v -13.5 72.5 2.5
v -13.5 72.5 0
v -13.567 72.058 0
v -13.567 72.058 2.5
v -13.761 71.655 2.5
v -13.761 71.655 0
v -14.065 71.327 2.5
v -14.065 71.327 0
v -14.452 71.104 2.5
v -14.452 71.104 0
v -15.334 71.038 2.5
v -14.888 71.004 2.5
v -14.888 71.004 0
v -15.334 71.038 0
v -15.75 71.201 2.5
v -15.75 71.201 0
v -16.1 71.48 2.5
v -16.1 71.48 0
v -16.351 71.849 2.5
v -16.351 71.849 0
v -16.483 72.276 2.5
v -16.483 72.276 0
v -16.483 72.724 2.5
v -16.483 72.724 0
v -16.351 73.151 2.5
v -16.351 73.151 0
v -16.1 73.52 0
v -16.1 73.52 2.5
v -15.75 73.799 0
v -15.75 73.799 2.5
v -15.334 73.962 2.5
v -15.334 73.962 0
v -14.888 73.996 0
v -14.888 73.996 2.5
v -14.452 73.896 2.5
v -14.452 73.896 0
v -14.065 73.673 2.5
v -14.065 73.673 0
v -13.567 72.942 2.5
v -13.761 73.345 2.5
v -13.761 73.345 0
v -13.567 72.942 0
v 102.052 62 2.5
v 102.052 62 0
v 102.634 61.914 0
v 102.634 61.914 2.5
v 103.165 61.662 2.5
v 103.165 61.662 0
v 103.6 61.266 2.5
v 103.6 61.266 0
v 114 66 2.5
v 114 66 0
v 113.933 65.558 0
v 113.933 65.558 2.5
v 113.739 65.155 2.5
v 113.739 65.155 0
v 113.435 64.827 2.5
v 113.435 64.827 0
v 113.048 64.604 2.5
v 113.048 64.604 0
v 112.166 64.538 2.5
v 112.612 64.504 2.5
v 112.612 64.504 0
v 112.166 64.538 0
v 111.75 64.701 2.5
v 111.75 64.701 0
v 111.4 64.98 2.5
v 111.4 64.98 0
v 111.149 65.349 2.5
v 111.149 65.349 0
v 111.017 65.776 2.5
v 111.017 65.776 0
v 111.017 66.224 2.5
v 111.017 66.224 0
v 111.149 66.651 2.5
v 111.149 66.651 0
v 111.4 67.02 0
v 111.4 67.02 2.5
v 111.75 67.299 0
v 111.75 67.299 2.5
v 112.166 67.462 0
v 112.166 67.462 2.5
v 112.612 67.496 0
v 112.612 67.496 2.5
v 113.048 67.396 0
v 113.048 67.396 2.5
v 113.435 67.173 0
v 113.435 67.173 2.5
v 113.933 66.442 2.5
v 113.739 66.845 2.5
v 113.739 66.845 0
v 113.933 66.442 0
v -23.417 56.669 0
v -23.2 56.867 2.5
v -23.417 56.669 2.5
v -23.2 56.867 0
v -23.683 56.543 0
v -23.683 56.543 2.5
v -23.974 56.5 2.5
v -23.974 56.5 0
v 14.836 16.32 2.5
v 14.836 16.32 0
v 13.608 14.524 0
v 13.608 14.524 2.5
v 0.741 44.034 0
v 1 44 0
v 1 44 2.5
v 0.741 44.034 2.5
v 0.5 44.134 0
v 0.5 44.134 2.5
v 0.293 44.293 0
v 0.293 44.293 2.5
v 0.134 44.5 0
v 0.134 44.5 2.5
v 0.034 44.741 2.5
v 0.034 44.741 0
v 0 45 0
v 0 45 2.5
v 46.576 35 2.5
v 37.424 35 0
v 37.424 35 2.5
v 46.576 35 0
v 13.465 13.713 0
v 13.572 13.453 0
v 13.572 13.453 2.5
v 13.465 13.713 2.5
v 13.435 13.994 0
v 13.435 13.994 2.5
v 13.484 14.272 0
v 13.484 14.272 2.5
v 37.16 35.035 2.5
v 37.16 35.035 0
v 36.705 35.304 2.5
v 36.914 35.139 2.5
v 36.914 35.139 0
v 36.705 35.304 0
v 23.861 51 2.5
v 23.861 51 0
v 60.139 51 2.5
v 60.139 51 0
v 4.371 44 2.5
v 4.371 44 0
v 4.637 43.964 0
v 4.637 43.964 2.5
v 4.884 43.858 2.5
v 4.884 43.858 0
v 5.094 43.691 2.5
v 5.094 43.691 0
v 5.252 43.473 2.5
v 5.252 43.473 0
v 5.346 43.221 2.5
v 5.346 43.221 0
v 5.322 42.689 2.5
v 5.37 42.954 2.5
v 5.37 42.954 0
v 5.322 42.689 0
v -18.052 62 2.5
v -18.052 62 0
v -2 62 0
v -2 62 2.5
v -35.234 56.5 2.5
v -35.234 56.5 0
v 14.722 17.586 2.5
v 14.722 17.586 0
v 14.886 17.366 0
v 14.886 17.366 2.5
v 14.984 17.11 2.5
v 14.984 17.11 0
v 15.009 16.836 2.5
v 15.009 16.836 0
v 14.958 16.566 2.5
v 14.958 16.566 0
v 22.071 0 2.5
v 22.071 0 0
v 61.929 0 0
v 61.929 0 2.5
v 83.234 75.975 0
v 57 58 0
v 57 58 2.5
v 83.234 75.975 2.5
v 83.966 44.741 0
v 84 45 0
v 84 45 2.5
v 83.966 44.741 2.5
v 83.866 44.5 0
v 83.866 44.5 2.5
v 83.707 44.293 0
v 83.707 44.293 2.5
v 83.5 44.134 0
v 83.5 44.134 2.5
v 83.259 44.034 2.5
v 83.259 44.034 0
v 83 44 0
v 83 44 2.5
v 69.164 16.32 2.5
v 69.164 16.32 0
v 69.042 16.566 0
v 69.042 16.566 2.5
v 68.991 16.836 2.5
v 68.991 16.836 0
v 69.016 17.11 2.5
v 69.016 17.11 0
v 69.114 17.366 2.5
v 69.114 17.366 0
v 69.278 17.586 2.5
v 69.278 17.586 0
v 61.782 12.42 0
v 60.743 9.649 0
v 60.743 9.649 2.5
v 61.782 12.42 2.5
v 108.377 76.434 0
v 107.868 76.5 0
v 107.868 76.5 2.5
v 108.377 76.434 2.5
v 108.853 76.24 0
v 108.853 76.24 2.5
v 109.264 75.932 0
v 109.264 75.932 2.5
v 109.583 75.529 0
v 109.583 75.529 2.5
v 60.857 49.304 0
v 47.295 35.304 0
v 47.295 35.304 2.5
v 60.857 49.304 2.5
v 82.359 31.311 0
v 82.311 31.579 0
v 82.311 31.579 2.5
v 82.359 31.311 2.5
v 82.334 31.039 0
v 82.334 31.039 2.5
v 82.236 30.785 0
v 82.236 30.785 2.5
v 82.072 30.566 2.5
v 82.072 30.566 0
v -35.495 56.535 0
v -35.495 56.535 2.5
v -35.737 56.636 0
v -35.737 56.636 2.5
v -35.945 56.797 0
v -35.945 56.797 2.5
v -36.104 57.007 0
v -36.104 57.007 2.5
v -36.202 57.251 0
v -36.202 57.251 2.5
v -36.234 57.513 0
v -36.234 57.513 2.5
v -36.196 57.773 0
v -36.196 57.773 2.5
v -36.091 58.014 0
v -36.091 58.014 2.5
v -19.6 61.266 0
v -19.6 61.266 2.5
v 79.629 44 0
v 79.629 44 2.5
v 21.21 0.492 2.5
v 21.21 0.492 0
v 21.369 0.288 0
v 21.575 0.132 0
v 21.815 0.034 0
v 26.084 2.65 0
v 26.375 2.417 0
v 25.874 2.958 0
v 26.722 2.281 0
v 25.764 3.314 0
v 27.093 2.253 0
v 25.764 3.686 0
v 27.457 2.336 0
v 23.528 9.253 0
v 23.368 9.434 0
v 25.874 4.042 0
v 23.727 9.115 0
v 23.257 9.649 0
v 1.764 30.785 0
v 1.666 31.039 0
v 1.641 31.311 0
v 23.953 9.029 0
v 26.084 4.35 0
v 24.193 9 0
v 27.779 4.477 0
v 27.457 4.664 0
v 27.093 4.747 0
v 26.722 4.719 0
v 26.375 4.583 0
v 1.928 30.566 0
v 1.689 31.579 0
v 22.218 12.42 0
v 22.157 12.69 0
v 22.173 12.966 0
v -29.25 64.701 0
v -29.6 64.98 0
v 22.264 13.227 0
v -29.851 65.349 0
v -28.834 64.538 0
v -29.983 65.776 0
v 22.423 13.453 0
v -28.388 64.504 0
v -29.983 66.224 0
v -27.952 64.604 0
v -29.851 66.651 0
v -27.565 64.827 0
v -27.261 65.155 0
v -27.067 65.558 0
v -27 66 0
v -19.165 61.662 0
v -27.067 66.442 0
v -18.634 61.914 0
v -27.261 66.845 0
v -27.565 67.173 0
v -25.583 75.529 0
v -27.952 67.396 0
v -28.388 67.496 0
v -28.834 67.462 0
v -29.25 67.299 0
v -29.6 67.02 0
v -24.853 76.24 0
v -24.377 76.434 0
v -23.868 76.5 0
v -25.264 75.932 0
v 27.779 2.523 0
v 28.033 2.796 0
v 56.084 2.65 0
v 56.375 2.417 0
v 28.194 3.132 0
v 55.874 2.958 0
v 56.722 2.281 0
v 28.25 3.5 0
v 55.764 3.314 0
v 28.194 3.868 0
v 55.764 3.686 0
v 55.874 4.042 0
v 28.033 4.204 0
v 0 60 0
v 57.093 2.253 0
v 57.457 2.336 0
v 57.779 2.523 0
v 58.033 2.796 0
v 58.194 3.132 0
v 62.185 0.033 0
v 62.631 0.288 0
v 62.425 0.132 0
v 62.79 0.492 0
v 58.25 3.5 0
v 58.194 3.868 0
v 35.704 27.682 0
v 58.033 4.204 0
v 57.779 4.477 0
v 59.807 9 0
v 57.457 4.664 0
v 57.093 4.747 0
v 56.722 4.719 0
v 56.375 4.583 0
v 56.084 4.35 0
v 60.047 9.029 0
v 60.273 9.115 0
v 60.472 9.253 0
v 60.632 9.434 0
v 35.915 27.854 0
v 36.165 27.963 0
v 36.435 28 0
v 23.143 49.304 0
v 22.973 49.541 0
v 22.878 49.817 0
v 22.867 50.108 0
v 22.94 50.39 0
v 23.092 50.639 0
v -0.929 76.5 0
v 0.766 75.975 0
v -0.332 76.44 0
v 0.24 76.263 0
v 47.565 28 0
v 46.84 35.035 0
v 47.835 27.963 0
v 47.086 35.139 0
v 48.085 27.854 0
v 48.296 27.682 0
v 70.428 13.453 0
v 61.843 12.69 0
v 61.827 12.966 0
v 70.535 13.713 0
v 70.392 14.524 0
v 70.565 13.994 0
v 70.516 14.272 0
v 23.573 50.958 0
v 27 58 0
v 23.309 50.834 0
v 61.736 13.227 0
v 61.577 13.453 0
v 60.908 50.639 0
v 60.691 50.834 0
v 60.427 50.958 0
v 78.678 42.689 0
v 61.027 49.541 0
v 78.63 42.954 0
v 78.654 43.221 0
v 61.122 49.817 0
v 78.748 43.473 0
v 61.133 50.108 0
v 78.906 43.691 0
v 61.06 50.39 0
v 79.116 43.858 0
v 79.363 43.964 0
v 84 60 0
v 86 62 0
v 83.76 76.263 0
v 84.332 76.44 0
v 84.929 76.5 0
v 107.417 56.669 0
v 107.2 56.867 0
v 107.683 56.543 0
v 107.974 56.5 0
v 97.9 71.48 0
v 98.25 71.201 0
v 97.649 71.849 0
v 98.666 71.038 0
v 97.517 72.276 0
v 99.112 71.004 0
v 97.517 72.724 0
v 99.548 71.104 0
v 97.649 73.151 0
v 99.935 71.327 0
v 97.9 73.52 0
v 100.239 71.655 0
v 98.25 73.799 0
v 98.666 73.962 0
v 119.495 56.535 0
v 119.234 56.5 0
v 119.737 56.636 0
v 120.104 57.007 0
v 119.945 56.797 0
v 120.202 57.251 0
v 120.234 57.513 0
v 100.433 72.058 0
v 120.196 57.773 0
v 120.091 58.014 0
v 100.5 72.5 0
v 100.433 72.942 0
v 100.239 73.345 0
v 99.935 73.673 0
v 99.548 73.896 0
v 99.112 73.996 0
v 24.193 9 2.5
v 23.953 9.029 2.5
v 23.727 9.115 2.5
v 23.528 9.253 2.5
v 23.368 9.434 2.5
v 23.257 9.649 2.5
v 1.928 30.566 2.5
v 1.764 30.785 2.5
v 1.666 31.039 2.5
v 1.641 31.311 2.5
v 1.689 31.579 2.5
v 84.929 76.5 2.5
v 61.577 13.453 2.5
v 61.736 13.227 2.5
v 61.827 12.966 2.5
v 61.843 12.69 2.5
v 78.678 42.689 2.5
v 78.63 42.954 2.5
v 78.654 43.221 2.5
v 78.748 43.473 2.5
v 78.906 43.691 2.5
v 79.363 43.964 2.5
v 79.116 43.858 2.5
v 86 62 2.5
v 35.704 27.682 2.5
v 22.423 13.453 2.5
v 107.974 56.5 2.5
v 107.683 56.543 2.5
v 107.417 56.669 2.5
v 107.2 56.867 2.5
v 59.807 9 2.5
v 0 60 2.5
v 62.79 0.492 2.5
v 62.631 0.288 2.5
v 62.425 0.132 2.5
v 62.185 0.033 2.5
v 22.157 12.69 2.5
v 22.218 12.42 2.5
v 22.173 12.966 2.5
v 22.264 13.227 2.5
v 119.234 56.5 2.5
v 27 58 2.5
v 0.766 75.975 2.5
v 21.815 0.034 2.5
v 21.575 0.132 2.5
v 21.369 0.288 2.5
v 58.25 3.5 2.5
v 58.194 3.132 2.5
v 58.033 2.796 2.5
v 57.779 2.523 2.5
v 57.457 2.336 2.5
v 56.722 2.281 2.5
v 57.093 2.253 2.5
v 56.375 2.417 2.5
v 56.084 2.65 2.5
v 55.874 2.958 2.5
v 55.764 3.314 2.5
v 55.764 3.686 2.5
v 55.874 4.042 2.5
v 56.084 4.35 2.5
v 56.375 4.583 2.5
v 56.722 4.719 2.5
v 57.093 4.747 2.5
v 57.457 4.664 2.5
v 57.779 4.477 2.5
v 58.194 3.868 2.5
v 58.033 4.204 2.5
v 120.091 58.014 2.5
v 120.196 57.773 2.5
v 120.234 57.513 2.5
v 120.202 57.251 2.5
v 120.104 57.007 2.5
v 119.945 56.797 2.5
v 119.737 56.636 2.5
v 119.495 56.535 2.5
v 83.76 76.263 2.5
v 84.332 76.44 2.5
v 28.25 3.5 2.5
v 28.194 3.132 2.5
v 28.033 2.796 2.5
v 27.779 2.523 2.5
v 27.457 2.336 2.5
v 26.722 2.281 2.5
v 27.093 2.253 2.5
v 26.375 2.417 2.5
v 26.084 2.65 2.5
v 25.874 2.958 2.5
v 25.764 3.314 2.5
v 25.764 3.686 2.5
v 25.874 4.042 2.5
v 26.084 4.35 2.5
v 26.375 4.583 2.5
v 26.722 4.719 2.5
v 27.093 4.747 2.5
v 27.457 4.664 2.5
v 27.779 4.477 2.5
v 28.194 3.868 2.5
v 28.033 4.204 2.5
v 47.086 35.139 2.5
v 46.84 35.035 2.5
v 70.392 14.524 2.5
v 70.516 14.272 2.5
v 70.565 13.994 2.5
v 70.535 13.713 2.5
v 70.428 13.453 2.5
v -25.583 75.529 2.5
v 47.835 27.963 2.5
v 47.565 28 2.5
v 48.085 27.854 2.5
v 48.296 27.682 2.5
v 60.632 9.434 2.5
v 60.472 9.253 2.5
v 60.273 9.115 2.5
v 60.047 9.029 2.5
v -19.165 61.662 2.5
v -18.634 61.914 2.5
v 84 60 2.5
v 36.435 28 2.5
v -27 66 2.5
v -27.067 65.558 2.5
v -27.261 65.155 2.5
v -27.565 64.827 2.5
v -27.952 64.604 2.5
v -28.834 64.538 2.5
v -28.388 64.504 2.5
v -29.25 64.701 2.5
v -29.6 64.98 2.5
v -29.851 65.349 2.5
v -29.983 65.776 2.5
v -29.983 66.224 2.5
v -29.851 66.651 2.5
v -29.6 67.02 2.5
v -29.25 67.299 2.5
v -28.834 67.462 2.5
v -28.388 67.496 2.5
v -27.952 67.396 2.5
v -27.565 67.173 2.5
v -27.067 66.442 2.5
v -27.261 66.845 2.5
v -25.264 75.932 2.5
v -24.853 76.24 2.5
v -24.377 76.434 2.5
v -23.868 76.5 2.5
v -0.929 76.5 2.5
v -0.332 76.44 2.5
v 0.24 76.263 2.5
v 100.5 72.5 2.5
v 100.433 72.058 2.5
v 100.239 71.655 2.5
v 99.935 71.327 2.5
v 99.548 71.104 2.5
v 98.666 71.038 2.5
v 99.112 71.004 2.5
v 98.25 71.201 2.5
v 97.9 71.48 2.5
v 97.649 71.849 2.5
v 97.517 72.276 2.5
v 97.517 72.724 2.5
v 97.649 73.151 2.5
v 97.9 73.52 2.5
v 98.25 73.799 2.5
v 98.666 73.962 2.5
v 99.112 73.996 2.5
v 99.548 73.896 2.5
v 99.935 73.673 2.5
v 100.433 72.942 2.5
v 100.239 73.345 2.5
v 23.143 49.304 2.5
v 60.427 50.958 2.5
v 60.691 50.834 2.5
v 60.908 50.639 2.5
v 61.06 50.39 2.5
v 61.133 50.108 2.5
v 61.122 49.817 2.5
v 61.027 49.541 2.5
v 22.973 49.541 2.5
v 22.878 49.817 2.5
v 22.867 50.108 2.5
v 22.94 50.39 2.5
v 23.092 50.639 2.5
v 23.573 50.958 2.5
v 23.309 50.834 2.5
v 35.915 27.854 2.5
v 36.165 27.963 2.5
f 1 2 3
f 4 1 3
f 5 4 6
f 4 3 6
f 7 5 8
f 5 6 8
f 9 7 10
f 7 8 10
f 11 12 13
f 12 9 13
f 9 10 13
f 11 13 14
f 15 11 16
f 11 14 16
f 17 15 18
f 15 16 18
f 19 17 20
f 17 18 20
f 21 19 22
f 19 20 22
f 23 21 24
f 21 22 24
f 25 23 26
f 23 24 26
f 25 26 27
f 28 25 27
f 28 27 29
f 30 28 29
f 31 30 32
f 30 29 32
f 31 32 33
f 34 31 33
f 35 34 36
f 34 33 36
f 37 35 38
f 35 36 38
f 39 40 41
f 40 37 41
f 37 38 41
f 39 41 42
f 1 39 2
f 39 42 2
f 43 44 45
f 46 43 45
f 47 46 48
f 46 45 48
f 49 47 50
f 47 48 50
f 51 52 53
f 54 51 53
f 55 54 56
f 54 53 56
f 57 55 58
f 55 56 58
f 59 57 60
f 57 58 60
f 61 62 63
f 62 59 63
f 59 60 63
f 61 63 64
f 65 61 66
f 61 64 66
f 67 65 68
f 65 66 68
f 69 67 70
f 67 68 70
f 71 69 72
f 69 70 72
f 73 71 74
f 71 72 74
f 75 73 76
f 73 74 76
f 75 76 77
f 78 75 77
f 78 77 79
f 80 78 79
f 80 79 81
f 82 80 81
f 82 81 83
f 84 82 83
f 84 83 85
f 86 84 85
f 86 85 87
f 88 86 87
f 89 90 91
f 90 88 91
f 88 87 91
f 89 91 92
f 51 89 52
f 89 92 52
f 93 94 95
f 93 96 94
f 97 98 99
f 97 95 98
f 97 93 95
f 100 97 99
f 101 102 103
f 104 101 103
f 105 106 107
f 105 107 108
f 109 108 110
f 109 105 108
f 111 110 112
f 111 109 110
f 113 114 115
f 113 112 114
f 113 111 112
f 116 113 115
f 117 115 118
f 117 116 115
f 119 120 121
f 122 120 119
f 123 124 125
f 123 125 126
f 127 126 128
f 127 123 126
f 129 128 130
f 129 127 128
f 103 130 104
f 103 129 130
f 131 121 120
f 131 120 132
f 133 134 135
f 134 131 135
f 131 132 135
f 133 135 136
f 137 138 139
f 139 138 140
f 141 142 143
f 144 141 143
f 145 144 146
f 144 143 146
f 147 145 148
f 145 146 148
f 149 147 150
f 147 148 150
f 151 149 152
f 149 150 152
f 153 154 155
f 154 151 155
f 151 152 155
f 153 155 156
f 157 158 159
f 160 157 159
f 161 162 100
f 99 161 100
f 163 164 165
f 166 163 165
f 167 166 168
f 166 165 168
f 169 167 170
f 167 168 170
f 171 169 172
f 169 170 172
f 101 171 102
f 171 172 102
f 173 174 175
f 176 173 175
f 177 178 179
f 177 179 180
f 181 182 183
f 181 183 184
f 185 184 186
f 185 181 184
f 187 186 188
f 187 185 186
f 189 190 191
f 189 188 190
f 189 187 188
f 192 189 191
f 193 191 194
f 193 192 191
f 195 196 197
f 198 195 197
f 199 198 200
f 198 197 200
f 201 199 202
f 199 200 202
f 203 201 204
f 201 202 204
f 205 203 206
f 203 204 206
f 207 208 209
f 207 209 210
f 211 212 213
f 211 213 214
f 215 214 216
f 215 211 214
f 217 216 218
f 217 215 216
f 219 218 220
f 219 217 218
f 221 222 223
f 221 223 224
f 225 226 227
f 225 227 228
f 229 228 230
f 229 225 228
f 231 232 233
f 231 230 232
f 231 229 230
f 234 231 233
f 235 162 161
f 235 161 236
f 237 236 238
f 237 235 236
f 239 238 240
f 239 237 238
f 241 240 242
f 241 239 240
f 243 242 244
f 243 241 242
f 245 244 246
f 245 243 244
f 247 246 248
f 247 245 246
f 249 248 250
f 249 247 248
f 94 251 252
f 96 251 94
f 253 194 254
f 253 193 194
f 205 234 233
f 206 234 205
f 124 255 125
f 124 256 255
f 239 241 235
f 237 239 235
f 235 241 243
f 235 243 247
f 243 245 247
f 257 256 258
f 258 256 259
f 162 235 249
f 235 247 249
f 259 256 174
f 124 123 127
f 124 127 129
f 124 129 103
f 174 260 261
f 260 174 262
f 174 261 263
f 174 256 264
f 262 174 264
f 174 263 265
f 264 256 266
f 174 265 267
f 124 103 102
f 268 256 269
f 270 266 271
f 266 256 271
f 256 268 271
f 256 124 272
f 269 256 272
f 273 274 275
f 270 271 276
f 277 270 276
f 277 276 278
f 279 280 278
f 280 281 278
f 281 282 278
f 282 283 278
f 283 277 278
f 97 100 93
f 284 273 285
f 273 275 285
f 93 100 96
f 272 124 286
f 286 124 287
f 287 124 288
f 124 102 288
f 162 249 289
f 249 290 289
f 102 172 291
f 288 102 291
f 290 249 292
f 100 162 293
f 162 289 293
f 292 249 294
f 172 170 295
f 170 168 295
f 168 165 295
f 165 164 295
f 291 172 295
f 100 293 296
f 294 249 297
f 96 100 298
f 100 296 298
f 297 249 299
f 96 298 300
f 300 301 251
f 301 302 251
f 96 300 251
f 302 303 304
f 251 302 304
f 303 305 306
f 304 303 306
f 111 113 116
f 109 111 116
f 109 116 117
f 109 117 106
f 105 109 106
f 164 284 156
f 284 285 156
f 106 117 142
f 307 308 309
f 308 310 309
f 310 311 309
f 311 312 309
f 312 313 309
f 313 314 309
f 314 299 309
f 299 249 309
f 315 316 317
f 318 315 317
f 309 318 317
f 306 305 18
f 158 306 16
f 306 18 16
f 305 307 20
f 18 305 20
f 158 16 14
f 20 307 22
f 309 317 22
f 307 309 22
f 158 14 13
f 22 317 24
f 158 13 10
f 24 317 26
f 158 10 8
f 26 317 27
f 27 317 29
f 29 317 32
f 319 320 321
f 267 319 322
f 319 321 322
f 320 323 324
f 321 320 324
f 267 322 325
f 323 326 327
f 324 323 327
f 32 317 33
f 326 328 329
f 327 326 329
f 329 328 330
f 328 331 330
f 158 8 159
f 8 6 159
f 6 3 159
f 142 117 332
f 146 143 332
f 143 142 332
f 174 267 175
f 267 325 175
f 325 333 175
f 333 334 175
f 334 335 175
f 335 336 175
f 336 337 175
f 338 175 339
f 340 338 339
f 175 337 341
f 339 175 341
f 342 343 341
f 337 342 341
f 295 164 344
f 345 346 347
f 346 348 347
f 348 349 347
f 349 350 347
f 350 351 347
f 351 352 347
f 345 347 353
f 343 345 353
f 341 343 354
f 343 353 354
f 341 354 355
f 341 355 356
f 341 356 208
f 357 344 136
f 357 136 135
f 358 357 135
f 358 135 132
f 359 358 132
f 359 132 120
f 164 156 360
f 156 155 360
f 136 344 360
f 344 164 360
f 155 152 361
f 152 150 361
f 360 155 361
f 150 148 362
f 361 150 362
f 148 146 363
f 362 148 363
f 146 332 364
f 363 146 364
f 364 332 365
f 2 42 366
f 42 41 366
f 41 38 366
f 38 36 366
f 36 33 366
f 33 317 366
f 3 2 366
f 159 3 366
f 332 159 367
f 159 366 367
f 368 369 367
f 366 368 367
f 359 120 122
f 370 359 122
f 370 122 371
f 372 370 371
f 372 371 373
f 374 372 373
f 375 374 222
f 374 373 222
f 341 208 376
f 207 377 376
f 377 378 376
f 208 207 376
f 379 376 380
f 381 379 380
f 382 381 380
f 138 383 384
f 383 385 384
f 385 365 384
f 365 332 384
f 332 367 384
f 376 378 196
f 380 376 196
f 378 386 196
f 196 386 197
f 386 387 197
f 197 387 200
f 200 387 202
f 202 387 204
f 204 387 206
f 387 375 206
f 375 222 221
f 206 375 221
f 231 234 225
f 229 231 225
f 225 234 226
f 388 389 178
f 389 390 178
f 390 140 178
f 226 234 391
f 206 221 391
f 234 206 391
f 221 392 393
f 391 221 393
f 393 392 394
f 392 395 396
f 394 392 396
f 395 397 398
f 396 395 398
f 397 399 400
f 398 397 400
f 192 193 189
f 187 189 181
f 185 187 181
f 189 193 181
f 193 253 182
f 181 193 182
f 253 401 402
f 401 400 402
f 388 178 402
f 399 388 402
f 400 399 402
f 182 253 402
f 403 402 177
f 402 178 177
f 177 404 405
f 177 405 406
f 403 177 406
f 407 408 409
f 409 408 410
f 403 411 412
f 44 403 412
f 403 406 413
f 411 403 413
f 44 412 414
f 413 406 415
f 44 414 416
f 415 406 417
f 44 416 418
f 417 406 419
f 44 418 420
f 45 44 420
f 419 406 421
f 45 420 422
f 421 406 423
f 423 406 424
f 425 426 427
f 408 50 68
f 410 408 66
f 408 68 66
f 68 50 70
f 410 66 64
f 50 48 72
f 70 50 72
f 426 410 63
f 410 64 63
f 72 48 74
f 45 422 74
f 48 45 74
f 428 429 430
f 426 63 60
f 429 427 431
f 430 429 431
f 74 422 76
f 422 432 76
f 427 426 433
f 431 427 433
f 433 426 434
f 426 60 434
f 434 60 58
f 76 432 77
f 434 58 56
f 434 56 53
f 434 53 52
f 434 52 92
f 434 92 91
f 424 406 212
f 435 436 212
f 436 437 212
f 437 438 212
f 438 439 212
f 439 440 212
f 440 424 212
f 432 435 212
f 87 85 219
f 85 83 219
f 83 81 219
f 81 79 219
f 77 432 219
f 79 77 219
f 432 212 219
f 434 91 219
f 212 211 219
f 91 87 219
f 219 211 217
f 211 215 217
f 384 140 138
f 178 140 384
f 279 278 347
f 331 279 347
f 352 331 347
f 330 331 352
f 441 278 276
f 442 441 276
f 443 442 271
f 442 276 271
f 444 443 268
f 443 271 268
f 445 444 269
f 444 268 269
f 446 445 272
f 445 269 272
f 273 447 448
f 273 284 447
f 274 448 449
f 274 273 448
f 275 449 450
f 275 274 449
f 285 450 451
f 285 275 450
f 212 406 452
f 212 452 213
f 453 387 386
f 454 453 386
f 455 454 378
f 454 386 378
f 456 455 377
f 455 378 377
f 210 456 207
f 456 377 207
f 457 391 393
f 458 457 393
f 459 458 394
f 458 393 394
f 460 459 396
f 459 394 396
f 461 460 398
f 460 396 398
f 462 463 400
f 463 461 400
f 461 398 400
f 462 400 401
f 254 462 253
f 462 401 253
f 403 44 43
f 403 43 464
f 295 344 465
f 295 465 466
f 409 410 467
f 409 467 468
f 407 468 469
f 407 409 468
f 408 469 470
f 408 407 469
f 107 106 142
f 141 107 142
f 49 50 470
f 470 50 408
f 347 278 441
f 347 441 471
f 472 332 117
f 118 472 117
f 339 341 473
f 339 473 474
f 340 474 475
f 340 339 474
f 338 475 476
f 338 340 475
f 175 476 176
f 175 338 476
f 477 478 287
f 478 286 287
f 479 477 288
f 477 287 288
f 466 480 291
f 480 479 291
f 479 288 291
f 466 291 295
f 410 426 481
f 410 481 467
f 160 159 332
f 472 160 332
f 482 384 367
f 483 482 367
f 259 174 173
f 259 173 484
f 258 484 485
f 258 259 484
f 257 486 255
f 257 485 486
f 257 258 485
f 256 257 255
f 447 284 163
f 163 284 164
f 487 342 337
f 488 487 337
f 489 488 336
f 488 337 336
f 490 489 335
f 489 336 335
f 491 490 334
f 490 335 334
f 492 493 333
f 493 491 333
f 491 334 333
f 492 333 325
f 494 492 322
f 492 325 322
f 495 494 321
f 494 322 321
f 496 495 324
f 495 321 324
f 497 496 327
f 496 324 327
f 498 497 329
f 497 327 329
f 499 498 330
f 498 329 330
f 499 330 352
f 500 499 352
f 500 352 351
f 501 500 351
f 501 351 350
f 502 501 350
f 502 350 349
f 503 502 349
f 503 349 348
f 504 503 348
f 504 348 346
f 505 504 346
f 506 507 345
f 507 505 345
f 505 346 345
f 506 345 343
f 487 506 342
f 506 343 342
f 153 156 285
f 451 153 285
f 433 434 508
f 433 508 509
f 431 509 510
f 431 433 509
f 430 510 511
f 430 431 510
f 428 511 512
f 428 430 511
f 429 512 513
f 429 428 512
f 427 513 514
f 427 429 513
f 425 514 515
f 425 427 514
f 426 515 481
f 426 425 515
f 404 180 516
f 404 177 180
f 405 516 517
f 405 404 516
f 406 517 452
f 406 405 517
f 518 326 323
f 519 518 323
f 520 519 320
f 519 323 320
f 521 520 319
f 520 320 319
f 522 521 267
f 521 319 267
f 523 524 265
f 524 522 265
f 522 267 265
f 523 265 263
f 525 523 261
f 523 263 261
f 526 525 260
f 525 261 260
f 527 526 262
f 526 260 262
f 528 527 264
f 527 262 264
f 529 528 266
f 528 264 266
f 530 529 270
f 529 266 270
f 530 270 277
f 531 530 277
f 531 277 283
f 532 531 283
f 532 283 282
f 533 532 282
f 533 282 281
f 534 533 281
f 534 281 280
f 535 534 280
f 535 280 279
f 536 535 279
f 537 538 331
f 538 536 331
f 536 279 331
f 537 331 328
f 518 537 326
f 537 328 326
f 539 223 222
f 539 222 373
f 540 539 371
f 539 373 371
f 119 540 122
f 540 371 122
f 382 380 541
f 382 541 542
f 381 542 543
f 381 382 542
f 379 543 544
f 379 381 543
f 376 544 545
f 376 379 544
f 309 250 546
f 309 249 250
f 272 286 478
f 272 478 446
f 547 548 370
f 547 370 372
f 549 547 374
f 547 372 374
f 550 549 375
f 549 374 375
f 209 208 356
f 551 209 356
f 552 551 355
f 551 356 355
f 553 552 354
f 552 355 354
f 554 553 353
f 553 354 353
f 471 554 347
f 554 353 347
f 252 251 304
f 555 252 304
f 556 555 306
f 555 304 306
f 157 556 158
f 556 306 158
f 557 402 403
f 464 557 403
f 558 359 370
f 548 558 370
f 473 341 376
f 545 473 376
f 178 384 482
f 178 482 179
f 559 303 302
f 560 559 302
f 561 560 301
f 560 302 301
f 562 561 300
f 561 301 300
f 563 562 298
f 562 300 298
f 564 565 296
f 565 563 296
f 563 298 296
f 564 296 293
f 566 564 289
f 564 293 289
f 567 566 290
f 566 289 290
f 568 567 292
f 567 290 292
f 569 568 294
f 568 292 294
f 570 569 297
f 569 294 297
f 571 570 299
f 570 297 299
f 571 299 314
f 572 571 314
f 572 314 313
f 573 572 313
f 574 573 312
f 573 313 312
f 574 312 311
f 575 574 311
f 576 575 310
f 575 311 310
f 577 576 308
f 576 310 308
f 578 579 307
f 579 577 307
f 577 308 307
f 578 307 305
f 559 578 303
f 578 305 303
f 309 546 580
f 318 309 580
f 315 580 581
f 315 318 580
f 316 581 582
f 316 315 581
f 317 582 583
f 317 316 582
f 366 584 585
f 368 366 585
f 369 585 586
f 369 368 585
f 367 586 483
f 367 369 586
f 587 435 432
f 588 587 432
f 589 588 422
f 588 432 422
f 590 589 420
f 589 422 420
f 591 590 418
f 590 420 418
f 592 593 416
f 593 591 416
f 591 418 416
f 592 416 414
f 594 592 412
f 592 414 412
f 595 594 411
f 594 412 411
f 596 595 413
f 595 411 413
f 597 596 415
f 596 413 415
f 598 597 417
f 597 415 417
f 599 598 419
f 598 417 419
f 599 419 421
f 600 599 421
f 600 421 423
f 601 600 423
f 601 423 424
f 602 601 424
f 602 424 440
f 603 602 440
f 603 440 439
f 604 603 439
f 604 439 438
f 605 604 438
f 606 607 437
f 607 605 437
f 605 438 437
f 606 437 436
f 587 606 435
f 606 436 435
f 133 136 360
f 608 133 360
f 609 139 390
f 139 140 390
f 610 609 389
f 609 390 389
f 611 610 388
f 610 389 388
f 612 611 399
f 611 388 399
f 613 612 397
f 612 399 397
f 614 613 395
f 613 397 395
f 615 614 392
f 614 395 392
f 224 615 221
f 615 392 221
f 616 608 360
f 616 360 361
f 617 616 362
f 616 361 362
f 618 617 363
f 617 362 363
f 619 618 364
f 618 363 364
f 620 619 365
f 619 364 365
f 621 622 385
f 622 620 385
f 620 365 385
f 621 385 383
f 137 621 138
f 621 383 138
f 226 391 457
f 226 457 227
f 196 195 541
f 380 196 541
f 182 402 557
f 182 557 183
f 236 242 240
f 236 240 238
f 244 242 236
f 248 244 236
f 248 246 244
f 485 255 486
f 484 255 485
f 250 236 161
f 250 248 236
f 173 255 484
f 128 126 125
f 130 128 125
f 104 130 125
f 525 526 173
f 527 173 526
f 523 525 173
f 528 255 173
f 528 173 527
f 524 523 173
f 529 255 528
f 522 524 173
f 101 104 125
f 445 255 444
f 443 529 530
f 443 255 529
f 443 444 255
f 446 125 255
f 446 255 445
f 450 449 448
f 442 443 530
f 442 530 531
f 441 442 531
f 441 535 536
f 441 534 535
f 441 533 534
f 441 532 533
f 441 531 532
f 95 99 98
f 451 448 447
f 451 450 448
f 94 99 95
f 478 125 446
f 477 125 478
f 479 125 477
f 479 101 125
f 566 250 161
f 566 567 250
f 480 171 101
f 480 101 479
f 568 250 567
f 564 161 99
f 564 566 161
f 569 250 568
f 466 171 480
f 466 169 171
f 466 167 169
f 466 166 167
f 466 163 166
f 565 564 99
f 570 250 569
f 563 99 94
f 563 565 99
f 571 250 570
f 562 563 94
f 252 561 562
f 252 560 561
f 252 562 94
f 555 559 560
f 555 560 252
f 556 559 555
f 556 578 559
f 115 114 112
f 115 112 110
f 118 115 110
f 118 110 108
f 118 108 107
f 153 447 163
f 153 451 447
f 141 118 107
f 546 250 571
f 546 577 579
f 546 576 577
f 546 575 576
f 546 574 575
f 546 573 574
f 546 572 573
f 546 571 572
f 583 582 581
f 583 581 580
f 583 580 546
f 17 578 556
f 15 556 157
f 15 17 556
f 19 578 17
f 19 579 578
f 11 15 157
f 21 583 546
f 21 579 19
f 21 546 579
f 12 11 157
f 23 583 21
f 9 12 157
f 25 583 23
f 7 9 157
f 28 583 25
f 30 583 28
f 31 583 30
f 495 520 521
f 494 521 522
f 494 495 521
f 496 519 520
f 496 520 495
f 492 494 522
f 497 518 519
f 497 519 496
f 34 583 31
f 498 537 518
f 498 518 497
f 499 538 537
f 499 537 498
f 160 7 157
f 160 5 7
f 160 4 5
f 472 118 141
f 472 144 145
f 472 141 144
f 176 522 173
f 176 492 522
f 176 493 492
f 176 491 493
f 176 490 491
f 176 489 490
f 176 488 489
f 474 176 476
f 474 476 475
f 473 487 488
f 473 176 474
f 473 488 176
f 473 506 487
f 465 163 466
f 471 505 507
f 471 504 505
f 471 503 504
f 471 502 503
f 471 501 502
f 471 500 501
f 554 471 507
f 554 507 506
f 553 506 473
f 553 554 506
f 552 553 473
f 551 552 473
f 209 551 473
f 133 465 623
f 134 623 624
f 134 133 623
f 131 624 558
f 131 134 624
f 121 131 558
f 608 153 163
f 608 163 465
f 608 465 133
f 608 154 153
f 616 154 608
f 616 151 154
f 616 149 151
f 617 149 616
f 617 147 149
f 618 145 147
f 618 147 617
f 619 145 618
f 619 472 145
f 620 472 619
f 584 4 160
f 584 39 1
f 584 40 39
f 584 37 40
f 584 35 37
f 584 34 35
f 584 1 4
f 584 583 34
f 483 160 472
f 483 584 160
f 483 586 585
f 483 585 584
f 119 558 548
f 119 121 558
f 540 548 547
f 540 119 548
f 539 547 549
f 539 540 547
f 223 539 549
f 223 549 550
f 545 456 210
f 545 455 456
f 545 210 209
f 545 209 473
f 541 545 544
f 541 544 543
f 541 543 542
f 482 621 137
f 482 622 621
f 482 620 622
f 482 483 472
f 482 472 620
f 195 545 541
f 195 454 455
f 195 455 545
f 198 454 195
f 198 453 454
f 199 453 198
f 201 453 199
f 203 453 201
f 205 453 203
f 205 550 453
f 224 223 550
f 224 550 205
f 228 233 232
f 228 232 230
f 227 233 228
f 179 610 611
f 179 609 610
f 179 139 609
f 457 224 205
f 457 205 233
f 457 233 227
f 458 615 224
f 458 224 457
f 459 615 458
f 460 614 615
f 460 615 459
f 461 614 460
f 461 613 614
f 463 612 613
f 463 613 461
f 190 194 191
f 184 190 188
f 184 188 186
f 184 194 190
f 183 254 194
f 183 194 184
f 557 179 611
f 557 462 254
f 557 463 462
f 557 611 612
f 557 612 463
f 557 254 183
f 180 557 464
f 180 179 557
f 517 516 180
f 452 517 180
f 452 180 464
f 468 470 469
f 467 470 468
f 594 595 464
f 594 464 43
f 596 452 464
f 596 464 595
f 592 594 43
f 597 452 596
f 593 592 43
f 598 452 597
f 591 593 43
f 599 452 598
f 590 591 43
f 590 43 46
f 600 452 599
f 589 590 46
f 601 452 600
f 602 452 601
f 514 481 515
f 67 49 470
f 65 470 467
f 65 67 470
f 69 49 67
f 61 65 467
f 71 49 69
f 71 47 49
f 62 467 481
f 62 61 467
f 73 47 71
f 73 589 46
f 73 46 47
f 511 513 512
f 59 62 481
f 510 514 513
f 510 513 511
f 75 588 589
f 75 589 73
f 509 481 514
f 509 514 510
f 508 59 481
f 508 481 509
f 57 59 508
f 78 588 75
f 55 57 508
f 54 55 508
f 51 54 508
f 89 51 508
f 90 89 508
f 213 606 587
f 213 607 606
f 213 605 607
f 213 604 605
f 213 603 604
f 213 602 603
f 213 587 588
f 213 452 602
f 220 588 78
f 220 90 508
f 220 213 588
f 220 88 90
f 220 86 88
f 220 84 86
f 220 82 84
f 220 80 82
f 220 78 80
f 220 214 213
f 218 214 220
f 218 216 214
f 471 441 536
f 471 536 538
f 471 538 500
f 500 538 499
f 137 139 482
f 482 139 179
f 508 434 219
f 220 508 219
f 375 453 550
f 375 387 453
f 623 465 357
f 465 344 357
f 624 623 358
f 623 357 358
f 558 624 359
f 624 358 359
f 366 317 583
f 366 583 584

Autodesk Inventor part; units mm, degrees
ref_plane "YZ Plane" through (0, 0, 0) normal (1, 0, 0) x (0, 1, 0)
ref_plane "XZ Plane" through (0, 0, 0) normal (0, 1, 0) x (-1, 0, 0)
ref_plane "XY Plane" through (0, 0, 0) normal (0, 0, 1) x (1, 0, 0)
sketch "Sketch1" plane through (0, 0, 0) normal (0, 0, 1) x (1, 0, 0)
  line L0 (0, 76.5) -> (84, 76.5) construction
  line L1 (84, 76.5) -> (84, 0) construction
  line L2 (84, 0) -> (0, 0) construction
  line L3 (0, 0) -> (0, 76.5) construction
  line L4 (-37, 76.5) -> (0, 76.5) construction
  line L5 (0, 76.5) -> (0, 62) construction
  line L6 (0, 62) -> (-37, 62) construction
  line L7 (-37, 62) -> (-37, 76.5) construction
  line L8 (84, 76.5) -> (121, 76.5) construction
  line L9 (121, 76.5) -> (121, 62) construction
  line L10 (121, 62) -> (84, 62) construction
  line L11 (84, 62) -> (84, 76.5) construction
  line L12 (27, 58) -> (57, 58)
  line L13 (27, 58) -> (0.7665, 75.9748)
  line L14 (57, 58) -> (83.2335, 75.9748)
  line L15 (13.25, 14) -> (70.75, 14) construction
  line L16 (0, 76.5) -> (-25, 76.5) construction
  line L17 (-37, 76.5) -> (-37, 56.5) construction
  line L18 (-36.0913, 58.0145) -> (-25.5826, 75.529)
  line L19 (-35.2338, 56.5) -> (-23.9739, 56.5)
  line L20 (0, 62) -> (-19, 62) construction
  line L21 (-19.6002, 61.2665) -> (-23.1999, 56.8668)
  line L22 (0, 44) -> (84, 44) construction
  line L23 (1, 44) -> (4.371, 44)
  line L24 (83, 44) -> (79.629, 44)
  line L25 (1.5, 31) -> (82.5, 31) construction
  line L26 (5.3215, 42.6893) -> (1.6893, 31.579)
  line L27 (78.6785, 42.6893) -> (82.3107, 31.579)
  line L28 (15.3, 17) -> (68.7, 17) construction
  line L29 (82.0724, 30.5662) -> (69.278, 17.5864)
  line L30 (1.9276, 30.5662) -> (14.722, 17.5864)
  line L31 (69.1645, 16.3202) -> (70.3916, 14.5245)
  line L32 (14.8355, 16.3202) -> (13.6084, 14.5245)
  line L33 (21.5, 0) -> (62.5, 0) construction
  line L34 (21.2099, 0.4923) -> (13.5725, 13.4527)
  line L35 (62.7901, 0.4923) -> (70.4275, 13.4527)
  line L36 (84, 76.5) -> (109, 76.5) construction
  line L37 (121, 76.5) -> (121, 56.5) construction
  line L38 (120.0913, 58.0145) -> (109.5826, 75.529)
  line L39 (119.2338, 56.5) -> (107.9739, 56.5)
  line L40 (84, 62) -> (103, 62) construction
  line L41 (103.6002, 61.2665) -> (107.1999, 56.8668)
  line L42 (-23.8676, 76.5) -> (-0.9292, 76.5)
  line L43 (84.9292, 76.5) -> (107.8676, 76.5)
  line L44 (-18.0522, 62) -> (-2, 62)
  line L45 (102.0522, 62) -> (86, 62)
  line L46 (0, 60) -> (0, 45)
  line L47 (84, 60) -> (84, 45)
  line L48 (22.0714, 0) -> (61.9286, 0)
  line L49 (23.861, 51) -> (60.139, 51)
  line L50 (37.4235, 35) -> (46.5765, 35)
  line L51 (47.2947, 35.3042) -> (60.8572, 49.3042)
  line L52 (36.7053, 35.3042) -> (23.1428, 49.3042)
  line L53 (36.4346, 28) -> (47.5654, 28)
  line L54 (22, 13) -> (62, 13) construction
  line L55 (24.193, 9) -> (59.807, 9)
  line L56 (60.7433, 9.6489) -> (61.7824, 12.4197)
  line L57 (61.5771, 13.4531) -> (48.2965, 27.6823)
  line L58 (35.7035, 27.6823) -> (22.4229, 13.4531)
  line L59 (22.2176, 12.4197) -> (23.2567, 9.6489)
  line L60 (-28.5, 66) -> (112.5, 66) construction
  line L61 (-15, 72.5) -> (99, 72.5) construction
  line L62 (27, 3.5) -> (57, 3.5) construction
  arc A0 (0.7665, 75.9748) -> (-0.9292, 76.5) centre (-0.9292, 73.5) ccw
  arc A1 (84.9292, 76.5) -> (83.2335, 75.9748) centre (84.9292, 73.5) ccw
  arc A2 (-23.8676, 76.5) -> (-25.5826, 75.529) centre (-23.8676, 74.5) ccw
  arc A3 (109.5826, 75.529) -> (107.8676, 76.5) centre (107.8676, 74.5) ccw
  arc A4 (119.2338, 56.5) -> (120.0913, 58.0145) centre (119.2338, 57.5) ccw
  arc A5 (-36.0913, 58.0145) -> (-35.2338, 56.5) centre (-35.2338, 57.5) ccw
  arc A6 (-23.9739, 56.5) -> (-23.1999, 56.8668) centre (-23.9739, 57.5) ccw
  arc A7 (107.1999, 56.8668) -> (107.9739, 56.5) centre (107.9739, 57.5) ccw
  arc A8 (103.6002, 61.2665) -> (102.0522, 62) centre (102.0522, 60) ccw
  arc A9 (-18.0522, 62) -> (-19.6002, 61.2665) centre (-18.0522, 60) ccw
  line L63 (-2, 62) -> (0, 60)
  line L64 (84, 60) -> (86, 62)
  arc A10 (0, 45) -> (1, 44) centre (1, 45) ccw
  arc A11 (83, 44) -> (84, 45) centre (83, 45) ccw
  arc A12 (79.629, 44) -> (78.6785, 42.6893) centre (79.629, 43) ccw
  arc A13 (5.3215, 42.6893) -> (4.371, 44) centre (4.371, 43) ccw
  arc A14 (1.6893, 31.579) -> (1.9276, 30.5662) centre (2.6398, 31.2682) ccw
  arc A15 (82.0724, 30.5662) -> (82.3107, 31.579) centre (81.3602, 31.2682) ccw
  arc A16 (69.278, 17.5864) -> (69.1645, 16.3202) centre (69.9902, 16.8844) ccw
  arc A17 (70.4275, 13.4527) -> (70.3916, 14.5245) centre (69.5659, 13.9603) ccw
  arc A18 (61.9286, 0) -> (62.7901, 0.4923) centre (61.9286, 1) ccw
  arc A19 (21.2099, 0.4923) -> (22.0714, 0) centre (22.0714, 1) ccw
  arc A20 (13.6084, 14.5245) -> (13.5725, 13.4527) centre (14.4341, 13.9603) ccw
  arc A21 (14.8355, 16.3202) -> (14.722, 17.5864) centre (14.0098, 16.8844) ccw
  arc A22 (23.2567, 9.6489) -> (24.193, 9) centre (24.193, 10) ccw
  arc A23 (22.4229, 13.4531) -> (22.2176, 12.4197) centre (23.154, 12.7708) ccw
  arc A24 (36.4346, 28) -> (35.7035, 27.6823) centre (36.4346, 27) ccw
  arc A25 (48.2965, 27.6823) -> (47.5654, 28) centre (47.5654, 27) ccw
  arc A26 (61.7824, 12.4197) -> (61.5771, 13.4531) centre (60.846, 12.7708) ccw
  arc A27 (59.807, 9) -> (60.7433, 9.6489) centre (59.807, 10) ccw
  arc A28 (23.861, 51) -> (23.1428, 49.3042) centre (23.861, 50) ccw
  arc A29 (60.8572, 49.3042) -> (60.139, 51) centre (60.139, 50) ccw
  arc A30 (46.5765, 35) -> (47.2947, 35.3042) centre (46.5765, 36) ccw
  arc A31 (36.7053, 35.3042) -> (37.4235, 35) centre (37.4235, 36) ccw
  circle A32 centre (-15, 72.5) radius 1.5
  circle A33 centre (-28.5, 66) radius 1.5
  circle A34 centre (112.5, 66) radius 1.5
  circle A35 centre (99, 72.5) radius 1.5
  circle A36 centre (57, 3.5) radius 1.25
  circle A37 centre (27, 3.5) radius 1.25
  point P0 (-23.5, 56.5)
  point P1 (5.75, 44)
  point P2 (78.25, 44)
  point P3 (107.5, 56.5)
  point P4 (21.5, 51)
  point P5 (62.5, 51)
  point P6 (37, 35)
  point P7 (47, 35)
  point P8 (36, 28)
  point P9 (48, 28)
  point P10 (23.5, 9)
  point P11 (60.5, 9)
  dimension "d0" = 84
  dimension "d1" = 76.5
  dimension "d2" = 37
  dimension "d3" = 14.5
  dimension "d4" = 14.5
  dimension "d5" = 37
  dimension "d7" = 30
  dimension "d8" = 27
  dimension "d9" = 58
  dimension "d10" = 57.5
  dimension "d11" = 13.25
  dimension "d12" = 14
  dimension "d13" = 25
  dimension "d14" = 20
  dimension "d15" = 13.5
  dimension "d16" = 19
  dimension "d17" = 18
  dimension "d18" = 5.75
  dimension "d19" = 5.75
  dimension "d20" = 81
  dimension "d21" = 13
  dimension "d22" = 1.5
  dimension "d23" = 53.4
  dimension "d24" = 14
  dimension "d25" = 15.3
  dimension "d26" = 41
  dimension "d27" = 21.5
  dimension "d28" = 25
  dimension "d29" = 20
  dimension "d30" = 13.5
  dimension "d31" = 19
  dimension "d32" = 41
  dimension "d33" = 21.5
  dimension "d34" = 7
  dimension "d35" = 10
  dimension "d36" = 23
  dimension "d37" = 37
  dimension "d38" = 12
  dimension "d39" = 28
  dimension "d40" = 36
  dimension "d41" = 40
  dimension "d42" = 13
  dimension "d43" = 22
  dimension "d44" = 37
  dimension "d45" = 9
  dimension "d46" = 23.5
  dimension "d47" = 141
  dimension "d48" = 10.5
  dimension "d49" = 8.5
  dimension "d50" = 114
  dimension "d51" = 4
  dimension "d52" = 22
  dimension "d53" = 30
  dimension "d54" = 3.5
  dimension "d55" = 27
  dimension "d56" = 3
  dimension "d57" = 3
  dimension "d58" = 2
  dimension "d59" = 2
  dimension "d60" = 1
  dimension "d61" = 1
  dimension "d62" = 1
  dimension "d63" = 1
  dimension "d64" = 2
extrude "Extrusion2" add sketch "Sketch1" along normal blind 2.5
properties part number "RCT-H001_Al_side_plate"
